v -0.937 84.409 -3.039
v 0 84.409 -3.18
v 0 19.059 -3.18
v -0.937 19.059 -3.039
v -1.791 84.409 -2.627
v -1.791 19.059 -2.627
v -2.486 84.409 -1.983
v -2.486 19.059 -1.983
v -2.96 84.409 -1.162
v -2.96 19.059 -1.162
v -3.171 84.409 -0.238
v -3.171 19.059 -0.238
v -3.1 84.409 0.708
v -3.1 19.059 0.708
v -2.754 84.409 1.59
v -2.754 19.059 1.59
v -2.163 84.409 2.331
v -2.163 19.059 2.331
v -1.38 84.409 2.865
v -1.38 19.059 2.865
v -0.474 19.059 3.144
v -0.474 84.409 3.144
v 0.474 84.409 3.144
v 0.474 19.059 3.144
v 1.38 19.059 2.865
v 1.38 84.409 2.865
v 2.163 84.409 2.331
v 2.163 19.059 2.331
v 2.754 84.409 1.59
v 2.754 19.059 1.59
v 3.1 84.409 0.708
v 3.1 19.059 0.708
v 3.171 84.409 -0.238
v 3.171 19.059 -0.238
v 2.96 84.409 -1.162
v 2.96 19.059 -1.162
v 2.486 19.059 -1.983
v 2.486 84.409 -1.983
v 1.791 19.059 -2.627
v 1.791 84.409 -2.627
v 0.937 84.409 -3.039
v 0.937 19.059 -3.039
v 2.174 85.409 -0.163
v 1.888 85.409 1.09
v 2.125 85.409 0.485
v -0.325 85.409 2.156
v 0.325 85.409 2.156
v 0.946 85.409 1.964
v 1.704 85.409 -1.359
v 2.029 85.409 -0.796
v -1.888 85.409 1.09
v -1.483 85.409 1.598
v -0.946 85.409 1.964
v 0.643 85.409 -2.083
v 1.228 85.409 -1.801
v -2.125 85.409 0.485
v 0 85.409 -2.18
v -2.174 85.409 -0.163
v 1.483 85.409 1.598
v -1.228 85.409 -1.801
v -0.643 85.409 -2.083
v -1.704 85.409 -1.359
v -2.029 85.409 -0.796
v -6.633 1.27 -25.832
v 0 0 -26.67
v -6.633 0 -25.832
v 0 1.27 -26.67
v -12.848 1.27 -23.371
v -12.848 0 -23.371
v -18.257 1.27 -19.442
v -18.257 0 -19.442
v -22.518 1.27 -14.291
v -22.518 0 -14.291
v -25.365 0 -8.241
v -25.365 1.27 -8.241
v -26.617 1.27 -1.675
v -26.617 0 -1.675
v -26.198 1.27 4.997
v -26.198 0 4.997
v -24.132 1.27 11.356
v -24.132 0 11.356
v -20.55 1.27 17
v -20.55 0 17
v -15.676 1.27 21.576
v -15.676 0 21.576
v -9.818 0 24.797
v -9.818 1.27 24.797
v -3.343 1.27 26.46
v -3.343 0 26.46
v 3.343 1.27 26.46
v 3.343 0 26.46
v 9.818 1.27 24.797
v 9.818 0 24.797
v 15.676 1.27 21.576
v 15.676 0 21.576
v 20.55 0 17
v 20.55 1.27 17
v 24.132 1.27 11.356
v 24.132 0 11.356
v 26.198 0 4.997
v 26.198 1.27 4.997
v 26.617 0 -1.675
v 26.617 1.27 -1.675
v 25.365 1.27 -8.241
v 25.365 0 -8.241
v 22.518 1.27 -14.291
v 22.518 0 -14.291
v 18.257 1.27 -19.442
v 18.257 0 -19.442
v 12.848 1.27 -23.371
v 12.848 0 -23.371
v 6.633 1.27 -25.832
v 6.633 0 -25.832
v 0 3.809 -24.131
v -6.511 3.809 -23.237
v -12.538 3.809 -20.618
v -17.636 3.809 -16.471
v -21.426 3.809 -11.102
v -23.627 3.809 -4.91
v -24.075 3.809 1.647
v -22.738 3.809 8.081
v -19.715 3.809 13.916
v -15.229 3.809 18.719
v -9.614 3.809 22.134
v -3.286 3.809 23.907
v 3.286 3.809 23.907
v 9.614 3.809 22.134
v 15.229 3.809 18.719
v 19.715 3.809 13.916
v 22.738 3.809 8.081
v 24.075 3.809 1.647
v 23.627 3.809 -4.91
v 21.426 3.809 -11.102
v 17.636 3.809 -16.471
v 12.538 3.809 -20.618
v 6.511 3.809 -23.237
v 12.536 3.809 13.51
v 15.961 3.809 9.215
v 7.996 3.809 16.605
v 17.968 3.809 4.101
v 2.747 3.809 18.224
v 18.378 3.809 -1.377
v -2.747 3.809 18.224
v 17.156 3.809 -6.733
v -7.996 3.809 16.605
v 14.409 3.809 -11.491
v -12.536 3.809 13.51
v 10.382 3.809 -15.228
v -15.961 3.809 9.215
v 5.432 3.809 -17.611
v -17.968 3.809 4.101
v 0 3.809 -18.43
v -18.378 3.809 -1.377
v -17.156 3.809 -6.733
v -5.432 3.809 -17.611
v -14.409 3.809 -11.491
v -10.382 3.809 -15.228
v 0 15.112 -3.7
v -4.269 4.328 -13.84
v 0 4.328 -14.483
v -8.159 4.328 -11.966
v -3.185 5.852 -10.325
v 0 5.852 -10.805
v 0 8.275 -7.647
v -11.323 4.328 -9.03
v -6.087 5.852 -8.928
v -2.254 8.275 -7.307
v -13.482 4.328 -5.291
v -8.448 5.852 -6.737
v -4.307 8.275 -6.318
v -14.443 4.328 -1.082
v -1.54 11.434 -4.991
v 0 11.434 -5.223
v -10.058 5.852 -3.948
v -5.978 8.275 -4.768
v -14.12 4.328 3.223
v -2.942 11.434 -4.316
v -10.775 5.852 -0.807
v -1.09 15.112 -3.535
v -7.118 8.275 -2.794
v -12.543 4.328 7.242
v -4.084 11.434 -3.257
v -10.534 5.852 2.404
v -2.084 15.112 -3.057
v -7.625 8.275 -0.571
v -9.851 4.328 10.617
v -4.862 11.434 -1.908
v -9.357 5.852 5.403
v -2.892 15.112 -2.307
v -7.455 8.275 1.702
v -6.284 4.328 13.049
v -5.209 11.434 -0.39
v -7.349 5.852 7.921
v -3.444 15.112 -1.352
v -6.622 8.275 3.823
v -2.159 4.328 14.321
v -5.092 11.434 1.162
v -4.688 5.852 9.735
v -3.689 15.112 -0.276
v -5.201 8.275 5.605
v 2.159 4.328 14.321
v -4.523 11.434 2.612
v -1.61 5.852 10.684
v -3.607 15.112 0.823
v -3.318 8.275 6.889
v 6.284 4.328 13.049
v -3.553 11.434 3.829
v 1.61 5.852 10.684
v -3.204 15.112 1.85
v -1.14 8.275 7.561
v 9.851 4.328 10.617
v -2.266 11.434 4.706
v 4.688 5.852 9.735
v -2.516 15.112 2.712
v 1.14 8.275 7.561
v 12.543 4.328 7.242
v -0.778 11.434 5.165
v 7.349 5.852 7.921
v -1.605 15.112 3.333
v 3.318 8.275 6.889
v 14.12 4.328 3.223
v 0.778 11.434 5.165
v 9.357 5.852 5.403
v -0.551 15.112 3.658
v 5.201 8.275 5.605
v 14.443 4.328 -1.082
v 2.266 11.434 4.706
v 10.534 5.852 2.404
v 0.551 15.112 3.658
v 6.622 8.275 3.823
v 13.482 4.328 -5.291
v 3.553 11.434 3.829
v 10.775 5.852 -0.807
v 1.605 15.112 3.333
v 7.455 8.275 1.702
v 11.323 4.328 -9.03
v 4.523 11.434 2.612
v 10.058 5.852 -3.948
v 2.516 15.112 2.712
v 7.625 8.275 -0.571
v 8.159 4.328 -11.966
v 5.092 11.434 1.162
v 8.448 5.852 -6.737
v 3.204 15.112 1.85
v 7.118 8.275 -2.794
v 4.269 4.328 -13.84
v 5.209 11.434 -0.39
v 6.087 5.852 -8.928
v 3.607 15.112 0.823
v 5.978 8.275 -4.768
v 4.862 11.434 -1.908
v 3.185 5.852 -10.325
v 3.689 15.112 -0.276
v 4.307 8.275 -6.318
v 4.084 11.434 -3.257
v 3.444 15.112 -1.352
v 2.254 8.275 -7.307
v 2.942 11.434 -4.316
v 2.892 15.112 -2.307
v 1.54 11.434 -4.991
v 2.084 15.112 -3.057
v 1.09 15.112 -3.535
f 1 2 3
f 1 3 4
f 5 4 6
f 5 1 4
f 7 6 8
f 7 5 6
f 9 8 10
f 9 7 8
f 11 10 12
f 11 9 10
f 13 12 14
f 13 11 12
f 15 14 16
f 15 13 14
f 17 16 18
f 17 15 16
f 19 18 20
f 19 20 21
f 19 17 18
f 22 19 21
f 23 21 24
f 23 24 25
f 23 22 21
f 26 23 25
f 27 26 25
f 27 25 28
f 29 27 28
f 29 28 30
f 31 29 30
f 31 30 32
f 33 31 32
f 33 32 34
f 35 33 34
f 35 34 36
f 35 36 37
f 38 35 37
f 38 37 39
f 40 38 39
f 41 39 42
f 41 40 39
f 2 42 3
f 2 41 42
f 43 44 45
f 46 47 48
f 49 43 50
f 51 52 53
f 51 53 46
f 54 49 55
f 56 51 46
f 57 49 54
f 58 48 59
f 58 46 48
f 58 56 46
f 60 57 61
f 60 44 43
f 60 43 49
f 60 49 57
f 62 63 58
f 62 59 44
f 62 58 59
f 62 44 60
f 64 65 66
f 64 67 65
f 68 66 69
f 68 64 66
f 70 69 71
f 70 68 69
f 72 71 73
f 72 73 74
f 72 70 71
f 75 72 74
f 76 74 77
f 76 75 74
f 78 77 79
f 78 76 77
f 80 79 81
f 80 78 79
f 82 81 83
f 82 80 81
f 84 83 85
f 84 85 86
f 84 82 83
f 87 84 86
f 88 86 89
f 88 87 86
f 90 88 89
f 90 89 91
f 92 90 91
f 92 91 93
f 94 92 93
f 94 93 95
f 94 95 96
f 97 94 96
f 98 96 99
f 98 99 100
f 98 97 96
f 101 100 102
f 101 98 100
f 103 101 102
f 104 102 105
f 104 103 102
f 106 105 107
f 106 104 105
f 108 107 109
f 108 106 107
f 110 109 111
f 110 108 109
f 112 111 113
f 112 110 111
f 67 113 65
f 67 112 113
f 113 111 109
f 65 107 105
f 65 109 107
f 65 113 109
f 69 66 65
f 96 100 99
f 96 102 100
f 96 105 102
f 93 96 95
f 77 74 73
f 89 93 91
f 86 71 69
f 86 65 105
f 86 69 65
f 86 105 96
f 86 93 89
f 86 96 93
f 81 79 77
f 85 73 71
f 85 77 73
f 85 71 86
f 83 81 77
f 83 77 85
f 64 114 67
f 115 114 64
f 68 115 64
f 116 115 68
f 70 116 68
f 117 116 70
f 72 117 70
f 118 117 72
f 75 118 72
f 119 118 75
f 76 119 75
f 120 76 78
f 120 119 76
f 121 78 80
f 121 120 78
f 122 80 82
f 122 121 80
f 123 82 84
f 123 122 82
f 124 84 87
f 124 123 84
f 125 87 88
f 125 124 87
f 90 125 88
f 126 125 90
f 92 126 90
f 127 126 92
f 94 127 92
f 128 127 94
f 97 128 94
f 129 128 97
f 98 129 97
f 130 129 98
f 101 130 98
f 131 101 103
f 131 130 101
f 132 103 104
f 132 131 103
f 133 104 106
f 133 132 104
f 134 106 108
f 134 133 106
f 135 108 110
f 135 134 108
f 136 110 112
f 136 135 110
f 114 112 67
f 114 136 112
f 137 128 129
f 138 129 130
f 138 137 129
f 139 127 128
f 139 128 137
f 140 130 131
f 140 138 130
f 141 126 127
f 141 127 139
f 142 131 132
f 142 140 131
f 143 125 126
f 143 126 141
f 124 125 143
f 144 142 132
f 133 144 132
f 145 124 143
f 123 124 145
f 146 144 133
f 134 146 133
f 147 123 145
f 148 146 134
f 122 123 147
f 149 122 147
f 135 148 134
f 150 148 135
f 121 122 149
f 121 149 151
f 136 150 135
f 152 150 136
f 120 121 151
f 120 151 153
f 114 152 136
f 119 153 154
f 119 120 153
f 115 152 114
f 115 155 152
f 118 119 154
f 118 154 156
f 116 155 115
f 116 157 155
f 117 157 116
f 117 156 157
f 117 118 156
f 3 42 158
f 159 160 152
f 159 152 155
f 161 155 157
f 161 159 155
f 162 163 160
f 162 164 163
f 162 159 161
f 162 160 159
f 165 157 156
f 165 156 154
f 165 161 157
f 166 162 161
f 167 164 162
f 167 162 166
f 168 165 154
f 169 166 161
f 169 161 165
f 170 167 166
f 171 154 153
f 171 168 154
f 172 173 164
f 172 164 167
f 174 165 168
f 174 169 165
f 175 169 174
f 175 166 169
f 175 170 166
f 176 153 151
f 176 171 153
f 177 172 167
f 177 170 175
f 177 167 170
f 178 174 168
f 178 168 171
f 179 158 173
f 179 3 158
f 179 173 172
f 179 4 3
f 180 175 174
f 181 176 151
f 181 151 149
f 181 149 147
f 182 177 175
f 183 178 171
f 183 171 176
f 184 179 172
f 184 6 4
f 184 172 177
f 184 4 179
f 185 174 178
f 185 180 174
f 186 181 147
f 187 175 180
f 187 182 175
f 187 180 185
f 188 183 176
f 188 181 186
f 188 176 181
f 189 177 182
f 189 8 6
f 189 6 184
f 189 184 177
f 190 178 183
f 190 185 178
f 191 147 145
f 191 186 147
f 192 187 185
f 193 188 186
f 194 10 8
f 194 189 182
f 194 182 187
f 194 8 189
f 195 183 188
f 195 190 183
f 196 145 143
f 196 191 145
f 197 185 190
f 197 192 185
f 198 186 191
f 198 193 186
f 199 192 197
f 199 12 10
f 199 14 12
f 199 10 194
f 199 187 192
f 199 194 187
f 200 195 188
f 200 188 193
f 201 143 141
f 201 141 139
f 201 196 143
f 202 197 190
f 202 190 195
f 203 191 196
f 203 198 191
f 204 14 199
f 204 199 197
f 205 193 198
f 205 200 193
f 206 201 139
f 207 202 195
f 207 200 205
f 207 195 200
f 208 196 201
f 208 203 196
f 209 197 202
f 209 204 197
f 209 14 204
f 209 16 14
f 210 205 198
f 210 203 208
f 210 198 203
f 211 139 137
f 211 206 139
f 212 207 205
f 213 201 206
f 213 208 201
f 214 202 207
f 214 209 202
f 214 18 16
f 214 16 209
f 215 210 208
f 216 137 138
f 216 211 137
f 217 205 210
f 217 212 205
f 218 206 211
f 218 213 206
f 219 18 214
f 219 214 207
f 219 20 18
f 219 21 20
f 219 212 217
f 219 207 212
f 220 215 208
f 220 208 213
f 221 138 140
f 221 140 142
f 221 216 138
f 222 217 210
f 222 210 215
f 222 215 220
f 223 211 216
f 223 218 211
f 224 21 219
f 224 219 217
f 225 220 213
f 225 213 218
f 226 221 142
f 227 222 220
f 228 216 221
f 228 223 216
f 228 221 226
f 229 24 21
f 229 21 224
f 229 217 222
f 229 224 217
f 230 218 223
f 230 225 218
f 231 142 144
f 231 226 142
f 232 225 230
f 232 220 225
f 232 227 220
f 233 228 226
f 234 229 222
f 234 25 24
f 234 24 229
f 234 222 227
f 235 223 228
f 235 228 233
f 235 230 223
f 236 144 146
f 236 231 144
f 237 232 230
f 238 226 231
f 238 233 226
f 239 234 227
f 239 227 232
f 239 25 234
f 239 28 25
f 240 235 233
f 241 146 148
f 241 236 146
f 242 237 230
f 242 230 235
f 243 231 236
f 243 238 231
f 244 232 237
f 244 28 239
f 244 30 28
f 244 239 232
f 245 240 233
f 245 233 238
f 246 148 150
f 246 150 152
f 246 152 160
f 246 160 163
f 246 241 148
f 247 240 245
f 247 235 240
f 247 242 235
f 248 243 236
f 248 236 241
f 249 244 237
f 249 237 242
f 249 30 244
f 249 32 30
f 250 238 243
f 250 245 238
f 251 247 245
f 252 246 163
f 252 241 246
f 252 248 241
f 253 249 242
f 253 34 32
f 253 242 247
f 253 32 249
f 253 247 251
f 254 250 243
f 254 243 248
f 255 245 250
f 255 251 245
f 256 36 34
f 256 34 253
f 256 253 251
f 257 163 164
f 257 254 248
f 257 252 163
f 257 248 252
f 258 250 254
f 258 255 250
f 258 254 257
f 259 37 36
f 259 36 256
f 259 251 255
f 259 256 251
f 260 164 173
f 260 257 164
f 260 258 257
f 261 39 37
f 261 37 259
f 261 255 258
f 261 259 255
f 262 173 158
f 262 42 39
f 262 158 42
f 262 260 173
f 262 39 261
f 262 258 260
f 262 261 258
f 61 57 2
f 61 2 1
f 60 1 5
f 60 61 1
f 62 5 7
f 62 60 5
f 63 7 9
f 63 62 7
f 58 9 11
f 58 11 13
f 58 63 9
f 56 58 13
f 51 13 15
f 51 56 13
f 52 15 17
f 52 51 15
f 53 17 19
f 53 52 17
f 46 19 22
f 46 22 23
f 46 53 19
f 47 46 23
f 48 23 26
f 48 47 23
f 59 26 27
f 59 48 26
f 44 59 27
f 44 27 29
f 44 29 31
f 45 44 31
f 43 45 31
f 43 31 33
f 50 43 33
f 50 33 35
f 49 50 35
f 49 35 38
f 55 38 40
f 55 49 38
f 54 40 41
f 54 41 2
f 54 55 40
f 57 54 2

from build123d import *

# Parameters (mm, degrees)
FILLET1_R     = 15.25
CHAMFER1_SIZE = 1


with BuildPart() as part:
    # Sketch1 → Revolve1 (revolve)
    with BuildSketch(Plane.XY, mode=Mode.PRIVATE) as revolve1_sk:
        Polygon((0, 0), (-26.67, 0), (-26.67, 1.27), (-24.131486656, 3.808513344), (-3.18, 3.808513344), (-3.18, 85.408513344), (0, 85.408513344), align=None)
    revolve(revolve1_sk.sketch.rotate(Axis((0, 0, 0), (0, 1, 0)), 270), axis=Axis((0, 0, 0), (0, 1, 0)))

    # Fillet1
    fillet1_edges = [part.edges().sort_by_distance(p)[0] for p in [
        (0, 3.808513344, 3.18),
    ]]
    fillet(fillet1_edges, radius=FILLET1_R)

    # Chamfer1
    chamfer1_edges = [part.edges().sort_by_distance(p)[0] for p in [
        (0, 85.408513344, 3.18),
    ]]
    chamfer(chamfer1_edges, length=CHAMFER1_SIZE)


solid = part.part
